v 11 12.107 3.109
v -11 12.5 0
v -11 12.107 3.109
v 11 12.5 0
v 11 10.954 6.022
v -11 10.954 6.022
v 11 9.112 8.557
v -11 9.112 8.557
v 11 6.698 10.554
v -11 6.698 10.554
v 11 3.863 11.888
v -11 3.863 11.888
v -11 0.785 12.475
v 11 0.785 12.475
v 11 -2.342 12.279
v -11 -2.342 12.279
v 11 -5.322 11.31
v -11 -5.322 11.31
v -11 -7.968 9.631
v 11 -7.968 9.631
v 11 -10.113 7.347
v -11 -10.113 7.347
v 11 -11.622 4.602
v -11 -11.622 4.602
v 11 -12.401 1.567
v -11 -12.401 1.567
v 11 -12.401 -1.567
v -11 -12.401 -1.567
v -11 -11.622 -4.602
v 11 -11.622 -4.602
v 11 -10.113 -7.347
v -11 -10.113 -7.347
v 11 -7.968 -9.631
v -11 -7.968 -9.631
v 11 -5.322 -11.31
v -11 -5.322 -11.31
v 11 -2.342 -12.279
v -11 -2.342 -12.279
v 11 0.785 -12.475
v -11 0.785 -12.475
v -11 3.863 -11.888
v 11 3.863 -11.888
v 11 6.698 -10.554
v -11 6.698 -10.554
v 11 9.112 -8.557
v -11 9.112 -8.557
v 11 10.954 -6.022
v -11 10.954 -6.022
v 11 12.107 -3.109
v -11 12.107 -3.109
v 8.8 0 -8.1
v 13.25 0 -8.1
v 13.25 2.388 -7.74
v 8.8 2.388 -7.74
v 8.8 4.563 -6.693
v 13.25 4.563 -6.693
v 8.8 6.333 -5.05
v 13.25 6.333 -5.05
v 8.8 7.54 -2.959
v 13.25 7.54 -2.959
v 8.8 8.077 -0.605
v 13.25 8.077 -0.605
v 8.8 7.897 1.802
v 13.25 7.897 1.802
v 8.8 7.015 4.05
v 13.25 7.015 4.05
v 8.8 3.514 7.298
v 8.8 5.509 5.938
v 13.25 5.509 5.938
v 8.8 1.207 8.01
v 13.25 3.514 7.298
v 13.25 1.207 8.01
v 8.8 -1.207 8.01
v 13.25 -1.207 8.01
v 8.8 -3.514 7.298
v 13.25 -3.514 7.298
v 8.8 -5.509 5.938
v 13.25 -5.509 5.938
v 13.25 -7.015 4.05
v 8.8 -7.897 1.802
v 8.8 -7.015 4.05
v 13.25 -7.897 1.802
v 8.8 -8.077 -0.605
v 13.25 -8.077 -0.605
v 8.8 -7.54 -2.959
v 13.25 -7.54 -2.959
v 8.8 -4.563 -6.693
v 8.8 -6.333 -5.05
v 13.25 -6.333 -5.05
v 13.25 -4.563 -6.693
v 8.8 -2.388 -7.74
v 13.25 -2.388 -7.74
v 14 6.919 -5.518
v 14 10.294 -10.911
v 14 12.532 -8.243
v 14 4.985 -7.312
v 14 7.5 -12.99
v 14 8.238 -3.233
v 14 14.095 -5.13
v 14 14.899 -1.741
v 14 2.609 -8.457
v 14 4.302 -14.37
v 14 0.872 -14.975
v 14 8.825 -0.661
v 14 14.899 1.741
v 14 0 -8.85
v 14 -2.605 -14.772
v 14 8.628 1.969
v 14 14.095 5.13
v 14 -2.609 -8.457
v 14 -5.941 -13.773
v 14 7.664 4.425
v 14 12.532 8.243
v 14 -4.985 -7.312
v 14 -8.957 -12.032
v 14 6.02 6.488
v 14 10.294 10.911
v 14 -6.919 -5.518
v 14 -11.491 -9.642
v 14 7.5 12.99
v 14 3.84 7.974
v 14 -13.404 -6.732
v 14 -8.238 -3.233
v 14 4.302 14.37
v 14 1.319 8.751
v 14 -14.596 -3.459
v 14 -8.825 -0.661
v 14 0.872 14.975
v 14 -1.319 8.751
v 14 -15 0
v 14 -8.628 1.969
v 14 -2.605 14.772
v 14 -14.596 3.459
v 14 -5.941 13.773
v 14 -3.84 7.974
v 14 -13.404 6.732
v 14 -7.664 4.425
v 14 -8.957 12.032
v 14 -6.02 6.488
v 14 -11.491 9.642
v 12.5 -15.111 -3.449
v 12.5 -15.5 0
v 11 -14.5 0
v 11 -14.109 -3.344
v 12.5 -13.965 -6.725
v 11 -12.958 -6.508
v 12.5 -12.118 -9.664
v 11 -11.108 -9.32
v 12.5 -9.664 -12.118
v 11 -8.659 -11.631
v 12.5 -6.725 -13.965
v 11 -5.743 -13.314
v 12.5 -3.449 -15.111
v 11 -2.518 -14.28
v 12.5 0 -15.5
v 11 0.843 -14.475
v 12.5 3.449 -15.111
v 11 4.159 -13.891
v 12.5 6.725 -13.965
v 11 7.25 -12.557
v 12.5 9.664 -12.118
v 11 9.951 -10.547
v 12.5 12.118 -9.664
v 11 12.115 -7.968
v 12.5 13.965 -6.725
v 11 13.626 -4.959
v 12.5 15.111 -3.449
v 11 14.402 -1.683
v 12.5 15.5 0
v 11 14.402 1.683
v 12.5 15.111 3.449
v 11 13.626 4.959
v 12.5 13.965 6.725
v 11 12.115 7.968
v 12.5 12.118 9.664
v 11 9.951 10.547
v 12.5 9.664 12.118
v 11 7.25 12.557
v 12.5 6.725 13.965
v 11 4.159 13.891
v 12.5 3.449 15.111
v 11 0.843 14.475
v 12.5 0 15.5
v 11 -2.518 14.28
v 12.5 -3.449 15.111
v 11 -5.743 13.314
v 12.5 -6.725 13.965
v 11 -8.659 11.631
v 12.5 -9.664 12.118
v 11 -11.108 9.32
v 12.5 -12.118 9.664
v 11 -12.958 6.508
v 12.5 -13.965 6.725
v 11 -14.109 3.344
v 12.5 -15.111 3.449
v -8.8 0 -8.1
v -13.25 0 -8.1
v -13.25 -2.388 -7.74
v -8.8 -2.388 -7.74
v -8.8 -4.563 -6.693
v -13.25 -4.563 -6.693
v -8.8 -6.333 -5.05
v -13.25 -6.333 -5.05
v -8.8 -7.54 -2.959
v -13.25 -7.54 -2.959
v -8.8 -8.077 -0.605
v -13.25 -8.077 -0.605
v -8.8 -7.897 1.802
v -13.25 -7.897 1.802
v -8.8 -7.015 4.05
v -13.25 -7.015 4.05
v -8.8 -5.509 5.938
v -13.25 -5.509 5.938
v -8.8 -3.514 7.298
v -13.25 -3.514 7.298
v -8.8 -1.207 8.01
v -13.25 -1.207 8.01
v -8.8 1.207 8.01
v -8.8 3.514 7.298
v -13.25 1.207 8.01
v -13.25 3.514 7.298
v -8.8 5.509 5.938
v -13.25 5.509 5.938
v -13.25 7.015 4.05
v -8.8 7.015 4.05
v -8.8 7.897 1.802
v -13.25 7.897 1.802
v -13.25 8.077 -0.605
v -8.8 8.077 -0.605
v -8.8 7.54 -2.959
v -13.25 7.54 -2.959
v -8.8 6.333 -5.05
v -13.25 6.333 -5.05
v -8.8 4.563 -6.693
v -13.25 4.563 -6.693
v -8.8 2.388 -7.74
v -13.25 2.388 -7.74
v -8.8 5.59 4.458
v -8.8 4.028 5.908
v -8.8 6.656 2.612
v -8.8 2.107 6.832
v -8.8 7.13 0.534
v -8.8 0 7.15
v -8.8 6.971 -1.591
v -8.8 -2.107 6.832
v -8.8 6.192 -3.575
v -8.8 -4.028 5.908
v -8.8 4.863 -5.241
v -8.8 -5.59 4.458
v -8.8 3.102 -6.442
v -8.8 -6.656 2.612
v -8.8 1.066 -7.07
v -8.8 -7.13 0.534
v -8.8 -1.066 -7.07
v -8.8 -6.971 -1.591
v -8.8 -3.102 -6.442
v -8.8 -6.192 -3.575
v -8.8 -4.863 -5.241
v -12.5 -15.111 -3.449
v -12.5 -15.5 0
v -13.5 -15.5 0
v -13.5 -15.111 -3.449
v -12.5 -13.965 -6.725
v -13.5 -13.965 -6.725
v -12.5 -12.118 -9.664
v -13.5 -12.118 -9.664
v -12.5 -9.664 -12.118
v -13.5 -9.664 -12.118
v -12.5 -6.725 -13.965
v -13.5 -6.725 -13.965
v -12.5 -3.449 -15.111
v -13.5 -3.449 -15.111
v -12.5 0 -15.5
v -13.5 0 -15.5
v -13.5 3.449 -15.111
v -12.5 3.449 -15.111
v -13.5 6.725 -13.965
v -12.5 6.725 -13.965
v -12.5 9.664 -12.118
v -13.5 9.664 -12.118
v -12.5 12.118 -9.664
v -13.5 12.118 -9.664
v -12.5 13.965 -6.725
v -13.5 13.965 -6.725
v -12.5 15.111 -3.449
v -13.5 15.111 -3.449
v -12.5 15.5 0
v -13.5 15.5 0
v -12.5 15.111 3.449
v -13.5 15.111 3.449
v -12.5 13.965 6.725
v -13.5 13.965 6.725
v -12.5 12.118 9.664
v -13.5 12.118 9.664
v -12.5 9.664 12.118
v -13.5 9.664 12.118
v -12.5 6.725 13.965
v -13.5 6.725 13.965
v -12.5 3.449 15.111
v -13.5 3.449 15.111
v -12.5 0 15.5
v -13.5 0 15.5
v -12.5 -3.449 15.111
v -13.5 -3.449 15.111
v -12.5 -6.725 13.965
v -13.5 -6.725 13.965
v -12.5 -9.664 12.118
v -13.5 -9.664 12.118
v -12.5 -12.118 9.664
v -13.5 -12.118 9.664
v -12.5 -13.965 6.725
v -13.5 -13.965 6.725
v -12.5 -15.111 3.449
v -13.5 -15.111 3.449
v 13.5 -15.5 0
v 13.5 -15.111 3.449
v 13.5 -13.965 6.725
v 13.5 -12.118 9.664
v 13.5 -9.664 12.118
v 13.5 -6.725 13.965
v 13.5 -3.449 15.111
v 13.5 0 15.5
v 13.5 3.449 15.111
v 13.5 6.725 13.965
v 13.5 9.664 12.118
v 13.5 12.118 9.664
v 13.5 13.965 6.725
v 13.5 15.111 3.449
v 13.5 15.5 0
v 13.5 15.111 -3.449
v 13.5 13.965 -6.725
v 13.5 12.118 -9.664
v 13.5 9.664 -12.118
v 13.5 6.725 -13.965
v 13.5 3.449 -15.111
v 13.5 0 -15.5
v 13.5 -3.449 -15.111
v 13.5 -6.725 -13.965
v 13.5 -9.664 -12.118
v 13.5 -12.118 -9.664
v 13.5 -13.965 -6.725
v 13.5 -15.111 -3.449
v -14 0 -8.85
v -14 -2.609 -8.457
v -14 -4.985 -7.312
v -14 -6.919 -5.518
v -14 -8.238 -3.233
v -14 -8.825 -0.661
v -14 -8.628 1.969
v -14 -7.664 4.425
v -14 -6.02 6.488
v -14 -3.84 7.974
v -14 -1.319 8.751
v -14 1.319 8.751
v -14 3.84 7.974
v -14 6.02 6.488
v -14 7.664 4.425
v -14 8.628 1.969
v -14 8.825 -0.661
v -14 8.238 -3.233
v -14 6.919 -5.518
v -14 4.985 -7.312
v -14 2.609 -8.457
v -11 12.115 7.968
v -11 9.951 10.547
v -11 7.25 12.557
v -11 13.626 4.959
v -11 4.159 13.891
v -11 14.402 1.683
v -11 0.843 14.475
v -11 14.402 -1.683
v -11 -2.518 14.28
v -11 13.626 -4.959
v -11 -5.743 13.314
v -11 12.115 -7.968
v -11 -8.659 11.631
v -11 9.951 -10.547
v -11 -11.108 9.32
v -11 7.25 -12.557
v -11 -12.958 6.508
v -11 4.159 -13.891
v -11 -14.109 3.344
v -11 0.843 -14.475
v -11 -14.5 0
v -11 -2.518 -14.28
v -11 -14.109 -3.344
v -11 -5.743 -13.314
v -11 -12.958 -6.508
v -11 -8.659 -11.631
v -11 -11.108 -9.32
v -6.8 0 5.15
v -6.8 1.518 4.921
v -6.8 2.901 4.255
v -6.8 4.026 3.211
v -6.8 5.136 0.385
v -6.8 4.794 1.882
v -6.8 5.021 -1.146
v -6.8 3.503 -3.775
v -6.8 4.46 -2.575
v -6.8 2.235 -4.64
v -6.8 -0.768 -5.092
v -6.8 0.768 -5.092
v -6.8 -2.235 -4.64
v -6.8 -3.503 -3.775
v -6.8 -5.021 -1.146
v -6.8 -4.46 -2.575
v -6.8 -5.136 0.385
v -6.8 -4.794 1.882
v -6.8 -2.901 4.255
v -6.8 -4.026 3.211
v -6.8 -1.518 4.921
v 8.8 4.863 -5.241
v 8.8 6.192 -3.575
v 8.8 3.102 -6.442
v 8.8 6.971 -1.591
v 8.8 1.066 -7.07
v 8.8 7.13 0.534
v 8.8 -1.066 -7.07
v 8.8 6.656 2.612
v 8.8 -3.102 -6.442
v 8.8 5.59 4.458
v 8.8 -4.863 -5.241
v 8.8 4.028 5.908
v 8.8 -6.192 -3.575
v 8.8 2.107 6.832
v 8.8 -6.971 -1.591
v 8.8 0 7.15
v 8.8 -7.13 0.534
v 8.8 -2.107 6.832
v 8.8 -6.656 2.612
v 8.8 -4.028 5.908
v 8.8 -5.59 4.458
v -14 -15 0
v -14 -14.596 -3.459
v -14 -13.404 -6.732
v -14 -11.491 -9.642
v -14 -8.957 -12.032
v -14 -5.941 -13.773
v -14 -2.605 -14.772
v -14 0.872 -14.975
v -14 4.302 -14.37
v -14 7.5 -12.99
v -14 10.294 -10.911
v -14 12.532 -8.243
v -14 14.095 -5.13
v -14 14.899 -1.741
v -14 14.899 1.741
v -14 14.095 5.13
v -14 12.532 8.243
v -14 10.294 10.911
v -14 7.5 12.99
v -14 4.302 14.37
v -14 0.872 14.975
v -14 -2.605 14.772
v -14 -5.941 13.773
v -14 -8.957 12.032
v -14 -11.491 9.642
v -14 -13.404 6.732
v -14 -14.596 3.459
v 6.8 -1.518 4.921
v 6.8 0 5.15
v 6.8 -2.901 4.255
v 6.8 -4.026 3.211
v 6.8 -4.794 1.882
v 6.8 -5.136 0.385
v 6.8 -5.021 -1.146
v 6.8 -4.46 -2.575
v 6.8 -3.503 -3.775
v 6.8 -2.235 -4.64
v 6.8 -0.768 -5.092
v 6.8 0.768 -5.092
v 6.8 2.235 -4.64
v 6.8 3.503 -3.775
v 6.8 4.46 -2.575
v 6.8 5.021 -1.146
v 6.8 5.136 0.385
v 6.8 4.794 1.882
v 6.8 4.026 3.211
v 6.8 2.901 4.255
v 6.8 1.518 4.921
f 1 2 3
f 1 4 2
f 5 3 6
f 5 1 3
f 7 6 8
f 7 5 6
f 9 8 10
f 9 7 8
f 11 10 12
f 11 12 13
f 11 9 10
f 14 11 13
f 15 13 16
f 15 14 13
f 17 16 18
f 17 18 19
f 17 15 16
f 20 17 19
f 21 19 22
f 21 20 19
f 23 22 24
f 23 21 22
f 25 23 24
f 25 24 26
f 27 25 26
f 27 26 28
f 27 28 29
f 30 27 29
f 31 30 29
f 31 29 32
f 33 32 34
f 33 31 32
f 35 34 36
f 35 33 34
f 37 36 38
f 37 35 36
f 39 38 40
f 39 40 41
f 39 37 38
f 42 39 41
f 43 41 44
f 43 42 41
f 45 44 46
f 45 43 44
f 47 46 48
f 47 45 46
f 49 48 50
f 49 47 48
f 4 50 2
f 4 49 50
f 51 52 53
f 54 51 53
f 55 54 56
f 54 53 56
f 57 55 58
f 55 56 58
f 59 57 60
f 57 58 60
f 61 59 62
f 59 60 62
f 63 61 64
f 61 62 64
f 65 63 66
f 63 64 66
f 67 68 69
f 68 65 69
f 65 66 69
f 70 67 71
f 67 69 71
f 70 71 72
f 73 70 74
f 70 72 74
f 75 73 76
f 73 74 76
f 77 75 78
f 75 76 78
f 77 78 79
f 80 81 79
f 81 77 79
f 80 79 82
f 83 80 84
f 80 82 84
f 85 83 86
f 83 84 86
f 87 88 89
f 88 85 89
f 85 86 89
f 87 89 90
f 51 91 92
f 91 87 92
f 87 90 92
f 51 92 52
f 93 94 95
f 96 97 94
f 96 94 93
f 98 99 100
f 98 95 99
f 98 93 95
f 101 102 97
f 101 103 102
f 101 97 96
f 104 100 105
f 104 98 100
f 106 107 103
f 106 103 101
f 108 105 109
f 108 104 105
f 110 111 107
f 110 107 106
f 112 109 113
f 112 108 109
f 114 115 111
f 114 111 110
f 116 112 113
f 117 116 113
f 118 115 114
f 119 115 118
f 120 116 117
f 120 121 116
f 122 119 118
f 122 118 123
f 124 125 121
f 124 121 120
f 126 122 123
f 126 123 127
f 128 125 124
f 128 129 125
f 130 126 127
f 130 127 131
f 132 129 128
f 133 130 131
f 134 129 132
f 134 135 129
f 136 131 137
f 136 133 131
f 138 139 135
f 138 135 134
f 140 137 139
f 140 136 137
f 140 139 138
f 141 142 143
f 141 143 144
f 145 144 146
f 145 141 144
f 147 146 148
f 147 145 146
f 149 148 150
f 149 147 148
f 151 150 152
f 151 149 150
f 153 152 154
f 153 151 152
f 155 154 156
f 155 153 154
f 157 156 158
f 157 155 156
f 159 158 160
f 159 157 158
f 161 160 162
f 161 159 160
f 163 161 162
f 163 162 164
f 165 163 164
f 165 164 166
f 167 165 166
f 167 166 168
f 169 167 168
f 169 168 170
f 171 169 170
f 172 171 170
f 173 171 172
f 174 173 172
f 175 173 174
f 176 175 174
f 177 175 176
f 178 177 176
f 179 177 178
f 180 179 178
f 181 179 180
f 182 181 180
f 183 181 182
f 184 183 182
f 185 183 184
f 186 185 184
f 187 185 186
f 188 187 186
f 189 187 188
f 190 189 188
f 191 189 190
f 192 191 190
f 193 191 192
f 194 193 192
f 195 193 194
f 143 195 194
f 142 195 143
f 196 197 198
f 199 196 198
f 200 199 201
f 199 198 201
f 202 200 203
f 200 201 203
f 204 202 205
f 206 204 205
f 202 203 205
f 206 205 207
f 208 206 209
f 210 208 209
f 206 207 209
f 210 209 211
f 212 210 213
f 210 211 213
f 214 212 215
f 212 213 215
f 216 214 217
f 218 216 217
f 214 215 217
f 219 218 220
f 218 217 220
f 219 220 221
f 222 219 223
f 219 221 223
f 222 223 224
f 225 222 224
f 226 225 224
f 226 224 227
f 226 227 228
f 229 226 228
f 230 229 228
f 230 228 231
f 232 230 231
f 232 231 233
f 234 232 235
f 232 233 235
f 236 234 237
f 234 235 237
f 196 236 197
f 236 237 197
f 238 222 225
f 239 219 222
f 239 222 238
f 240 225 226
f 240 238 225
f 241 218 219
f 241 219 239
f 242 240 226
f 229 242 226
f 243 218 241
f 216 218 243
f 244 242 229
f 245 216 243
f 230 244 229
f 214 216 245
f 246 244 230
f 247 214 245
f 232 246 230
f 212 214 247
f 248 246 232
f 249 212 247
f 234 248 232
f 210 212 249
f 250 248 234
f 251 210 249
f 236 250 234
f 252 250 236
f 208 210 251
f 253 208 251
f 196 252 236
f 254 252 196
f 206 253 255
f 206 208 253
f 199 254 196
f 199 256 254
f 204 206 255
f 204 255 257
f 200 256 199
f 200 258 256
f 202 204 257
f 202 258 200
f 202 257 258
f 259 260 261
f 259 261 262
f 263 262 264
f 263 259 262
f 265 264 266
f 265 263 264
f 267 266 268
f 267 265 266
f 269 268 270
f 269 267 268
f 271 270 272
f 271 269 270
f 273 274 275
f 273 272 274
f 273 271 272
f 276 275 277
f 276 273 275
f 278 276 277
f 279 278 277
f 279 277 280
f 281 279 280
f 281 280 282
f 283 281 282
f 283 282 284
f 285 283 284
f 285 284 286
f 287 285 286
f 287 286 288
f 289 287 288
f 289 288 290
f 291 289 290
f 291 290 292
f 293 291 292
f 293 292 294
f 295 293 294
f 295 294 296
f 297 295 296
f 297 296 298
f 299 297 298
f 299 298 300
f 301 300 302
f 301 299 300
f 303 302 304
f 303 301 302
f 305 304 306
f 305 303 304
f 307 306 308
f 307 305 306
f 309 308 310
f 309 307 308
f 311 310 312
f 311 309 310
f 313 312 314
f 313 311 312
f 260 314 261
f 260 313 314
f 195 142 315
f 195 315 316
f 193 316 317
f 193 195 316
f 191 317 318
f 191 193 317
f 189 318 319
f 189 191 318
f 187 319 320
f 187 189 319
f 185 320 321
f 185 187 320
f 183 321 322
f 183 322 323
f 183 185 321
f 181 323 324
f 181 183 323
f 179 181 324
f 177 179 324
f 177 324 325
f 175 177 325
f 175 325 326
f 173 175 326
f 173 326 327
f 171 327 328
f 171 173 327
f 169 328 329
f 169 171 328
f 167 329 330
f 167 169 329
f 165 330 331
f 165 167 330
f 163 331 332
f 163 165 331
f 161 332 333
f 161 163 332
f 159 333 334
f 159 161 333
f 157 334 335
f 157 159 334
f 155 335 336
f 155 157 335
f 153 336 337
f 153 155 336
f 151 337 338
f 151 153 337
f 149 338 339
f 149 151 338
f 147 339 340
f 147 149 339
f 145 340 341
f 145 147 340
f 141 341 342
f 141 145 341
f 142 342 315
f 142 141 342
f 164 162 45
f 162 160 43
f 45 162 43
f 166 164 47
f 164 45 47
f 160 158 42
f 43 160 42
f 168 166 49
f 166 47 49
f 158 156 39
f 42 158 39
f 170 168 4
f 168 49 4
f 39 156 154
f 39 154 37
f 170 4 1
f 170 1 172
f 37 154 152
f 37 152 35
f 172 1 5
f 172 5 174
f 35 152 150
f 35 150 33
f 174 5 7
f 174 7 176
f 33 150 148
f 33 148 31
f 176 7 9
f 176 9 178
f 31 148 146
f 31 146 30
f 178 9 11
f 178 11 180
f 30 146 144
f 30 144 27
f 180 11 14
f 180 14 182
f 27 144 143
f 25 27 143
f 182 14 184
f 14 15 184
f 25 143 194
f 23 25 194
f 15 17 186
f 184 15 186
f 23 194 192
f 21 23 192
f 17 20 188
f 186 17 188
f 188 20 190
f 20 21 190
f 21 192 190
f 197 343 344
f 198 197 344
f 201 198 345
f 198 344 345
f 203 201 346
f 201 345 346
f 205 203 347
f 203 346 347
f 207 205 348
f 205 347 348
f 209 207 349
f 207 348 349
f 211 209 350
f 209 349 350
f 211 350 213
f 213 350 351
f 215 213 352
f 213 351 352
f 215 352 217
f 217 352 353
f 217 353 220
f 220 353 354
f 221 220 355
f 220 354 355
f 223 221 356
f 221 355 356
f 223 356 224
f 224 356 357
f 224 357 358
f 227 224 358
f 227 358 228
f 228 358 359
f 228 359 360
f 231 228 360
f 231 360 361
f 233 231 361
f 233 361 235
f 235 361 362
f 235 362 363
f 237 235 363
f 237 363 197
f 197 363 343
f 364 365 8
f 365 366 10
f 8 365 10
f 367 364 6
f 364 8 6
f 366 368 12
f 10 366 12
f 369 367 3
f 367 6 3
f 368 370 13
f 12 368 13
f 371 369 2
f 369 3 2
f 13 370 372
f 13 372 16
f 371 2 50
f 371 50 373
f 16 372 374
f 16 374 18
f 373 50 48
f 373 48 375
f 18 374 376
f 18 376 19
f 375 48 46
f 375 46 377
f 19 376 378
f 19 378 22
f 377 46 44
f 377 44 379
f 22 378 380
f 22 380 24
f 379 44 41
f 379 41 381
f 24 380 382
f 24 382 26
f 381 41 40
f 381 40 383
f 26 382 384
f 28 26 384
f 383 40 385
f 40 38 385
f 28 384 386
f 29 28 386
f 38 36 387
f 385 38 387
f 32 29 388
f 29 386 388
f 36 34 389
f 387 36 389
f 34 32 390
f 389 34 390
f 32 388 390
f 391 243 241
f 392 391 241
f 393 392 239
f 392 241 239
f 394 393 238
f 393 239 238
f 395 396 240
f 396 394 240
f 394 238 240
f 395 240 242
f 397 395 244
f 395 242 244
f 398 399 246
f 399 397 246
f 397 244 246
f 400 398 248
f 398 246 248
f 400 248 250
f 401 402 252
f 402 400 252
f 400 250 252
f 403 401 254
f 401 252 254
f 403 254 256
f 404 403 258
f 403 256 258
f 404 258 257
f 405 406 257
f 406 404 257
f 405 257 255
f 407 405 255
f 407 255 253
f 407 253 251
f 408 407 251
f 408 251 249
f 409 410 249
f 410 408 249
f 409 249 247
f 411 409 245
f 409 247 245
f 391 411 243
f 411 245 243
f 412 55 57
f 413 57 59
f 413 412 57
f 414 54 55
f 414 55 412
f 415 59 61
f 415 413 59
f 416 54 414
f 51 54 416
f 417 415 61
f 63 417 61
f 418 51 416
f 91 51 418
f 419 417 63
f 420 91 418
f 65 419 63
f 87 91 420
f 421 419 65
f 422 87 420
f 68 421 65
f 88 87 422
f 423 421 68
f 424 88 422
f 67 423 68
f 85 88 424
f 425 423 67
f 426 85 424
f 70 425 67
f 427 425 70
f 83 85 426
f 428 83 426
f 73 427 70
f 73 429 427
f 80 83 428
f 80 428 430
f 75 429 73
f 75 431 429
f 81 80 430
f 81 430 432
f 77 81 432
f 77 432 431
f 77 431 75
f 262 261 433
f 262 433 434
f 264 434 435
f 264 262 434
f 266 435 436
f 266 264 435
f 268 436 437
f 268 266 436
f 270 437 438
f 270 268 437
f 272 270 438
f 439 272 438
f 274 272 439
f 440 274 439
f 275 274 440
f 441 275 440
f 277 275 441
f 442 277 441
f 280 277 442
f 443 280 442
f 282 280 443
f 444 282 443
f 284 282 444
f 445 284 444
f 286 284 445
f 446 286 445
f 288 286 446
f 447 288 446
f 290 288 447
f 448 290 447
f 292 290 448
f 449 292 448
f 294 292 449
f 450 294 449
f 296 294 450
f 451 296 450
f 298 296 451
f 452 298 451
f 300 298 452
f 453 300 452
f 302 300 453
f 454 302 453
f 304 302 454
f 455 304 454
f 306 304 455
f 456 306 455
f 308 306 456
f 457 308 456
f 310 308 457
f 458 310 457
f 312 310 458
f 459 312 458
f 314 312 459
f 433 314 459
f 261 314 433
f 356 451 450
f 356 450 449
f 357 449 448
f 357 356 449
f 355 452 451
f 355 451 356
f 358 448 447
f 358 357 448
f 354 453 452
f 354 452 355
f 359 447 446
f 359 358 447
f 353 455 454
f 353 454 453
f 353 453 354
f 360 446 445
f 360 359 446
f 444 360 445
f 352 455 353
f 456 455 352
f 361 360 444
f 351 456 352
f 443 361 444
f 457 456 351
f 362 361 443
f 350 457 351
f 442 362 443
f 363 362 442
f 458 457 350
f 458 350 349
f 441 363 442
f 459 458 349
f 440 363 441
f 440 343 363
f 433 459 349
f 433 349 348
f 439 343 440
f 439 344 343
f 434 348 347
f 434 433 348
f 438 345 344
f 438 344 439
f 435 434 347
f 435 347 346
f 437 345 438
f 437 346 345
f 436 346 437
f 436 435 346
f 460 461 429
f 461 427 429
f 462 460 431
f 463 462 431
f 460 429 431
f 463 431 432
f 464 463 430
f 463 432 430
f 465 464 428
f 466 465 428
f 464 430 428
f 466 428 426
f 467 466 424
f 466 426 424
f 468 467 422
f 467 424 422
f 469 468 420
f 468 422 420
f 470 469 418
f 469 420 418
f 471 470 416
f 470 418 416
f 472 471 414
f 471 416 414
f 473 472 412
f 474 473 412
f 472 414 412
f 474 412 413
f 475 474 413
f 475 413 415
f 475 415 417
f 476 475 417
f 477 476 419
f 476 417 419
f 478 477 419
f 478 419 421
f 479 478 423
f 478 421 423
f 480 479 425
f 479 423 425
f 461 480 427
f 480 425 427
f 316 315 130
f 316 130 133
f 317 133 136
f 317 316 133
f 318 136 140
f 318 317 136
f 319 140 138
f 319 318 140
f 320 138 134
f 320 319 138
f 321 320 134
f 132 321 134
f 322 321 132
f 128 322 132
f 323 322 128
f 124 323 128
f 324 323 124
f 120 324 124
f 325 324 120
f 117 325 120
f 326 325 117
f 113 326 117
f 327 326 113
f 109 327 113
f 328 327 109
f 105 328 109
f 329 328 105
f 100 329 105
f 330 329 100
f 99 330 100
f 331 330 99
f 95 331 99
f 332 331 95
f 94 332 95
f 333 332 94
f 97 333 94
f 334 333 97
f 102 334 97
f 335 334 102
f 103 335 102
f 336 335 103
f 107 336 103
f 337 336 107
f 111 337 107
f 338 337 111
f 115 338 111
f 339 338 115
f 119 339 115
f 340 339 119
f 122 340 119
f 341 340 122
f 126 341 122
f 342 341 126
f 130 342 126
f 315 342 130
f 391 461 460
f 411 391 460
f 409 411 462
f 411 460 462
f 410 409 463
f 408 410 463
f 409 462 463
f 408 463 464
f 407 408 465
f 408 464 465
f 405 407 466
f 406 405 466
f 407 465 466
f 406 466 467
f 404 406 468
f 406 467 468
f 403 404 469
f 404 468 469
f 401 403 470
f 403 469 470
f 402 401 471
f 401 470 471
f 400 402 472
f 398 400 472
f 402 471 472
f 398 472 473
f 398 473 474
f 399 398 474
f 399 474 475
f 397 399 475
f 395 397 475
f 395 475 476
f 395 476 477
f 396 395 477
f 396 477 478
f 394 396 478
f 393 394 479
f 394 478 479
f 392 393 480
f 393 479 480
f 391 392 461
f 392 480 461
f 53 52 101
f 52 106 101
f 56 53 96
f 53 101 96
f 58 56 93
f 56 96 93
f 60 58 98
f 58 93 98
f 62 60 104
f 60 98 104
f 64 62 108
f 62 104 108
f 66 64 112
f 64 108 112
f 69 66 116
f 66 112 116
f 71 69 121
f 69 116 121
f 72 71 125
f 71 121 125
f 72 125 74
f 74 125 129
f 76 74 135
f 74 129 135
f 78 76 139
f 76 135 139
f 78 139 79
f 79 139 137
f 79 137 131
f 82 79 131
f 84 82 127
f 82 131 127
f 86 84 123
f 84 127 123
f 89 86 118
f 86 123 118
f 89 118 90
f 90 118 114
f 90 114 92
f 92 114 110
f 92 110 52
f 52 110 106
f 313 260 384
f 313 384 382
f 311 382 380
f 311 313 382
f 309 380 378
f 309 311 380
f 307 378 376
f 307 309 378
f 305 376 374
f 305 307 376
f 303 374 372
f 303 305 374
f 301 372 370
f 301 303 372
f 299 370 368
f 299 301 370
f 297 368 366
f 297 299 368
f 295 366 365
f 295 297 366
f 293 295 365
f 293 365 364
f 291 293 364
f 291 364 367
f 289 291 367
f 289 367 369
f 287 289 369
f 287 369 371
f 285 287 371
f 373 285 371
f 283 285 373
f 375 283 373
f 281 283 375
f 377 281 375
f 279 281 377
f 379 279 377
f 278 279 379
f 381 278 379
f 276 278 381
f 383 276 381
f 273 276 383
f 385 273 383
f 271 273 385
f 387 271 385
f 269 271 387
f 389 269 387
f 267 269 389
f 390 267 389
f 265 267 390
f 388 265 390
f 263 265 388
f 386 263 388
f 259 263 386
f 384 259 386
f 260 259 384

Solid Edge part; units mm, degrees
sketch "Sketch1" plane through (0, 0, 0) normal (1, 0, 0) x (0, 1, 0)
  circle A0 centre (0, 0) radius 12.5
extrude "Extrusionsausprägung_15" add sketch "Sketch1" along normal mid plane 22
sketch "Sketch2" plane through (-11, 0, 0) normal (-1, 0, 0) x (0, -1, 0)
  circle A0 centre (0, 0) radius 15.5
extrude "Extrusionsausprägung_16" add sketch "Sketch2" along normal blind 3
chamfer "Fase_9" distance 1.5 distance2 1 1 edges at (-11, 15.5, 0) measured on face at (-13.47, -8.5776, 12.9103)
sketch "Sketch3" plane through (-14, 0, 0) normal (-1, 0, 0) x (0, 0, -1)
  circle A0 centre (0, 0) radius 8.1
extrude "Extrusionsausschnitt_23" cut sketch "Sketch3" against normal blind 5.2
chamfer "Fase_10" distance 0.75 angle 45 1 edges at (-14, 0, 8.1)
chamfer "Fase_11" distance 0.5 angle 45 1 edges at (-14, 15.5, 0)
mirror "Mirror1" about plane through (0, 0, 0) normal (1, 0, 0) of "Extrusionsausprägung_16", "Fase_9", "Extrusionsausschnitt_23", "Fase_10", "Fase_11"
sketch "Sketch4" plane through (8.8, 0, 0) normal (1, 0, 0) x (0, 0, 1)
  circle A0 centre (0, 0) radius 5.15
extrude "Extrusionsausschnitt_24" cut sketch "Sketch4" against normal blind 20
chamfer "Fase_12" distance 2 angle 45 2 edges at (8.8, 0, -5.15) (-8.8, -5.15, 0)
